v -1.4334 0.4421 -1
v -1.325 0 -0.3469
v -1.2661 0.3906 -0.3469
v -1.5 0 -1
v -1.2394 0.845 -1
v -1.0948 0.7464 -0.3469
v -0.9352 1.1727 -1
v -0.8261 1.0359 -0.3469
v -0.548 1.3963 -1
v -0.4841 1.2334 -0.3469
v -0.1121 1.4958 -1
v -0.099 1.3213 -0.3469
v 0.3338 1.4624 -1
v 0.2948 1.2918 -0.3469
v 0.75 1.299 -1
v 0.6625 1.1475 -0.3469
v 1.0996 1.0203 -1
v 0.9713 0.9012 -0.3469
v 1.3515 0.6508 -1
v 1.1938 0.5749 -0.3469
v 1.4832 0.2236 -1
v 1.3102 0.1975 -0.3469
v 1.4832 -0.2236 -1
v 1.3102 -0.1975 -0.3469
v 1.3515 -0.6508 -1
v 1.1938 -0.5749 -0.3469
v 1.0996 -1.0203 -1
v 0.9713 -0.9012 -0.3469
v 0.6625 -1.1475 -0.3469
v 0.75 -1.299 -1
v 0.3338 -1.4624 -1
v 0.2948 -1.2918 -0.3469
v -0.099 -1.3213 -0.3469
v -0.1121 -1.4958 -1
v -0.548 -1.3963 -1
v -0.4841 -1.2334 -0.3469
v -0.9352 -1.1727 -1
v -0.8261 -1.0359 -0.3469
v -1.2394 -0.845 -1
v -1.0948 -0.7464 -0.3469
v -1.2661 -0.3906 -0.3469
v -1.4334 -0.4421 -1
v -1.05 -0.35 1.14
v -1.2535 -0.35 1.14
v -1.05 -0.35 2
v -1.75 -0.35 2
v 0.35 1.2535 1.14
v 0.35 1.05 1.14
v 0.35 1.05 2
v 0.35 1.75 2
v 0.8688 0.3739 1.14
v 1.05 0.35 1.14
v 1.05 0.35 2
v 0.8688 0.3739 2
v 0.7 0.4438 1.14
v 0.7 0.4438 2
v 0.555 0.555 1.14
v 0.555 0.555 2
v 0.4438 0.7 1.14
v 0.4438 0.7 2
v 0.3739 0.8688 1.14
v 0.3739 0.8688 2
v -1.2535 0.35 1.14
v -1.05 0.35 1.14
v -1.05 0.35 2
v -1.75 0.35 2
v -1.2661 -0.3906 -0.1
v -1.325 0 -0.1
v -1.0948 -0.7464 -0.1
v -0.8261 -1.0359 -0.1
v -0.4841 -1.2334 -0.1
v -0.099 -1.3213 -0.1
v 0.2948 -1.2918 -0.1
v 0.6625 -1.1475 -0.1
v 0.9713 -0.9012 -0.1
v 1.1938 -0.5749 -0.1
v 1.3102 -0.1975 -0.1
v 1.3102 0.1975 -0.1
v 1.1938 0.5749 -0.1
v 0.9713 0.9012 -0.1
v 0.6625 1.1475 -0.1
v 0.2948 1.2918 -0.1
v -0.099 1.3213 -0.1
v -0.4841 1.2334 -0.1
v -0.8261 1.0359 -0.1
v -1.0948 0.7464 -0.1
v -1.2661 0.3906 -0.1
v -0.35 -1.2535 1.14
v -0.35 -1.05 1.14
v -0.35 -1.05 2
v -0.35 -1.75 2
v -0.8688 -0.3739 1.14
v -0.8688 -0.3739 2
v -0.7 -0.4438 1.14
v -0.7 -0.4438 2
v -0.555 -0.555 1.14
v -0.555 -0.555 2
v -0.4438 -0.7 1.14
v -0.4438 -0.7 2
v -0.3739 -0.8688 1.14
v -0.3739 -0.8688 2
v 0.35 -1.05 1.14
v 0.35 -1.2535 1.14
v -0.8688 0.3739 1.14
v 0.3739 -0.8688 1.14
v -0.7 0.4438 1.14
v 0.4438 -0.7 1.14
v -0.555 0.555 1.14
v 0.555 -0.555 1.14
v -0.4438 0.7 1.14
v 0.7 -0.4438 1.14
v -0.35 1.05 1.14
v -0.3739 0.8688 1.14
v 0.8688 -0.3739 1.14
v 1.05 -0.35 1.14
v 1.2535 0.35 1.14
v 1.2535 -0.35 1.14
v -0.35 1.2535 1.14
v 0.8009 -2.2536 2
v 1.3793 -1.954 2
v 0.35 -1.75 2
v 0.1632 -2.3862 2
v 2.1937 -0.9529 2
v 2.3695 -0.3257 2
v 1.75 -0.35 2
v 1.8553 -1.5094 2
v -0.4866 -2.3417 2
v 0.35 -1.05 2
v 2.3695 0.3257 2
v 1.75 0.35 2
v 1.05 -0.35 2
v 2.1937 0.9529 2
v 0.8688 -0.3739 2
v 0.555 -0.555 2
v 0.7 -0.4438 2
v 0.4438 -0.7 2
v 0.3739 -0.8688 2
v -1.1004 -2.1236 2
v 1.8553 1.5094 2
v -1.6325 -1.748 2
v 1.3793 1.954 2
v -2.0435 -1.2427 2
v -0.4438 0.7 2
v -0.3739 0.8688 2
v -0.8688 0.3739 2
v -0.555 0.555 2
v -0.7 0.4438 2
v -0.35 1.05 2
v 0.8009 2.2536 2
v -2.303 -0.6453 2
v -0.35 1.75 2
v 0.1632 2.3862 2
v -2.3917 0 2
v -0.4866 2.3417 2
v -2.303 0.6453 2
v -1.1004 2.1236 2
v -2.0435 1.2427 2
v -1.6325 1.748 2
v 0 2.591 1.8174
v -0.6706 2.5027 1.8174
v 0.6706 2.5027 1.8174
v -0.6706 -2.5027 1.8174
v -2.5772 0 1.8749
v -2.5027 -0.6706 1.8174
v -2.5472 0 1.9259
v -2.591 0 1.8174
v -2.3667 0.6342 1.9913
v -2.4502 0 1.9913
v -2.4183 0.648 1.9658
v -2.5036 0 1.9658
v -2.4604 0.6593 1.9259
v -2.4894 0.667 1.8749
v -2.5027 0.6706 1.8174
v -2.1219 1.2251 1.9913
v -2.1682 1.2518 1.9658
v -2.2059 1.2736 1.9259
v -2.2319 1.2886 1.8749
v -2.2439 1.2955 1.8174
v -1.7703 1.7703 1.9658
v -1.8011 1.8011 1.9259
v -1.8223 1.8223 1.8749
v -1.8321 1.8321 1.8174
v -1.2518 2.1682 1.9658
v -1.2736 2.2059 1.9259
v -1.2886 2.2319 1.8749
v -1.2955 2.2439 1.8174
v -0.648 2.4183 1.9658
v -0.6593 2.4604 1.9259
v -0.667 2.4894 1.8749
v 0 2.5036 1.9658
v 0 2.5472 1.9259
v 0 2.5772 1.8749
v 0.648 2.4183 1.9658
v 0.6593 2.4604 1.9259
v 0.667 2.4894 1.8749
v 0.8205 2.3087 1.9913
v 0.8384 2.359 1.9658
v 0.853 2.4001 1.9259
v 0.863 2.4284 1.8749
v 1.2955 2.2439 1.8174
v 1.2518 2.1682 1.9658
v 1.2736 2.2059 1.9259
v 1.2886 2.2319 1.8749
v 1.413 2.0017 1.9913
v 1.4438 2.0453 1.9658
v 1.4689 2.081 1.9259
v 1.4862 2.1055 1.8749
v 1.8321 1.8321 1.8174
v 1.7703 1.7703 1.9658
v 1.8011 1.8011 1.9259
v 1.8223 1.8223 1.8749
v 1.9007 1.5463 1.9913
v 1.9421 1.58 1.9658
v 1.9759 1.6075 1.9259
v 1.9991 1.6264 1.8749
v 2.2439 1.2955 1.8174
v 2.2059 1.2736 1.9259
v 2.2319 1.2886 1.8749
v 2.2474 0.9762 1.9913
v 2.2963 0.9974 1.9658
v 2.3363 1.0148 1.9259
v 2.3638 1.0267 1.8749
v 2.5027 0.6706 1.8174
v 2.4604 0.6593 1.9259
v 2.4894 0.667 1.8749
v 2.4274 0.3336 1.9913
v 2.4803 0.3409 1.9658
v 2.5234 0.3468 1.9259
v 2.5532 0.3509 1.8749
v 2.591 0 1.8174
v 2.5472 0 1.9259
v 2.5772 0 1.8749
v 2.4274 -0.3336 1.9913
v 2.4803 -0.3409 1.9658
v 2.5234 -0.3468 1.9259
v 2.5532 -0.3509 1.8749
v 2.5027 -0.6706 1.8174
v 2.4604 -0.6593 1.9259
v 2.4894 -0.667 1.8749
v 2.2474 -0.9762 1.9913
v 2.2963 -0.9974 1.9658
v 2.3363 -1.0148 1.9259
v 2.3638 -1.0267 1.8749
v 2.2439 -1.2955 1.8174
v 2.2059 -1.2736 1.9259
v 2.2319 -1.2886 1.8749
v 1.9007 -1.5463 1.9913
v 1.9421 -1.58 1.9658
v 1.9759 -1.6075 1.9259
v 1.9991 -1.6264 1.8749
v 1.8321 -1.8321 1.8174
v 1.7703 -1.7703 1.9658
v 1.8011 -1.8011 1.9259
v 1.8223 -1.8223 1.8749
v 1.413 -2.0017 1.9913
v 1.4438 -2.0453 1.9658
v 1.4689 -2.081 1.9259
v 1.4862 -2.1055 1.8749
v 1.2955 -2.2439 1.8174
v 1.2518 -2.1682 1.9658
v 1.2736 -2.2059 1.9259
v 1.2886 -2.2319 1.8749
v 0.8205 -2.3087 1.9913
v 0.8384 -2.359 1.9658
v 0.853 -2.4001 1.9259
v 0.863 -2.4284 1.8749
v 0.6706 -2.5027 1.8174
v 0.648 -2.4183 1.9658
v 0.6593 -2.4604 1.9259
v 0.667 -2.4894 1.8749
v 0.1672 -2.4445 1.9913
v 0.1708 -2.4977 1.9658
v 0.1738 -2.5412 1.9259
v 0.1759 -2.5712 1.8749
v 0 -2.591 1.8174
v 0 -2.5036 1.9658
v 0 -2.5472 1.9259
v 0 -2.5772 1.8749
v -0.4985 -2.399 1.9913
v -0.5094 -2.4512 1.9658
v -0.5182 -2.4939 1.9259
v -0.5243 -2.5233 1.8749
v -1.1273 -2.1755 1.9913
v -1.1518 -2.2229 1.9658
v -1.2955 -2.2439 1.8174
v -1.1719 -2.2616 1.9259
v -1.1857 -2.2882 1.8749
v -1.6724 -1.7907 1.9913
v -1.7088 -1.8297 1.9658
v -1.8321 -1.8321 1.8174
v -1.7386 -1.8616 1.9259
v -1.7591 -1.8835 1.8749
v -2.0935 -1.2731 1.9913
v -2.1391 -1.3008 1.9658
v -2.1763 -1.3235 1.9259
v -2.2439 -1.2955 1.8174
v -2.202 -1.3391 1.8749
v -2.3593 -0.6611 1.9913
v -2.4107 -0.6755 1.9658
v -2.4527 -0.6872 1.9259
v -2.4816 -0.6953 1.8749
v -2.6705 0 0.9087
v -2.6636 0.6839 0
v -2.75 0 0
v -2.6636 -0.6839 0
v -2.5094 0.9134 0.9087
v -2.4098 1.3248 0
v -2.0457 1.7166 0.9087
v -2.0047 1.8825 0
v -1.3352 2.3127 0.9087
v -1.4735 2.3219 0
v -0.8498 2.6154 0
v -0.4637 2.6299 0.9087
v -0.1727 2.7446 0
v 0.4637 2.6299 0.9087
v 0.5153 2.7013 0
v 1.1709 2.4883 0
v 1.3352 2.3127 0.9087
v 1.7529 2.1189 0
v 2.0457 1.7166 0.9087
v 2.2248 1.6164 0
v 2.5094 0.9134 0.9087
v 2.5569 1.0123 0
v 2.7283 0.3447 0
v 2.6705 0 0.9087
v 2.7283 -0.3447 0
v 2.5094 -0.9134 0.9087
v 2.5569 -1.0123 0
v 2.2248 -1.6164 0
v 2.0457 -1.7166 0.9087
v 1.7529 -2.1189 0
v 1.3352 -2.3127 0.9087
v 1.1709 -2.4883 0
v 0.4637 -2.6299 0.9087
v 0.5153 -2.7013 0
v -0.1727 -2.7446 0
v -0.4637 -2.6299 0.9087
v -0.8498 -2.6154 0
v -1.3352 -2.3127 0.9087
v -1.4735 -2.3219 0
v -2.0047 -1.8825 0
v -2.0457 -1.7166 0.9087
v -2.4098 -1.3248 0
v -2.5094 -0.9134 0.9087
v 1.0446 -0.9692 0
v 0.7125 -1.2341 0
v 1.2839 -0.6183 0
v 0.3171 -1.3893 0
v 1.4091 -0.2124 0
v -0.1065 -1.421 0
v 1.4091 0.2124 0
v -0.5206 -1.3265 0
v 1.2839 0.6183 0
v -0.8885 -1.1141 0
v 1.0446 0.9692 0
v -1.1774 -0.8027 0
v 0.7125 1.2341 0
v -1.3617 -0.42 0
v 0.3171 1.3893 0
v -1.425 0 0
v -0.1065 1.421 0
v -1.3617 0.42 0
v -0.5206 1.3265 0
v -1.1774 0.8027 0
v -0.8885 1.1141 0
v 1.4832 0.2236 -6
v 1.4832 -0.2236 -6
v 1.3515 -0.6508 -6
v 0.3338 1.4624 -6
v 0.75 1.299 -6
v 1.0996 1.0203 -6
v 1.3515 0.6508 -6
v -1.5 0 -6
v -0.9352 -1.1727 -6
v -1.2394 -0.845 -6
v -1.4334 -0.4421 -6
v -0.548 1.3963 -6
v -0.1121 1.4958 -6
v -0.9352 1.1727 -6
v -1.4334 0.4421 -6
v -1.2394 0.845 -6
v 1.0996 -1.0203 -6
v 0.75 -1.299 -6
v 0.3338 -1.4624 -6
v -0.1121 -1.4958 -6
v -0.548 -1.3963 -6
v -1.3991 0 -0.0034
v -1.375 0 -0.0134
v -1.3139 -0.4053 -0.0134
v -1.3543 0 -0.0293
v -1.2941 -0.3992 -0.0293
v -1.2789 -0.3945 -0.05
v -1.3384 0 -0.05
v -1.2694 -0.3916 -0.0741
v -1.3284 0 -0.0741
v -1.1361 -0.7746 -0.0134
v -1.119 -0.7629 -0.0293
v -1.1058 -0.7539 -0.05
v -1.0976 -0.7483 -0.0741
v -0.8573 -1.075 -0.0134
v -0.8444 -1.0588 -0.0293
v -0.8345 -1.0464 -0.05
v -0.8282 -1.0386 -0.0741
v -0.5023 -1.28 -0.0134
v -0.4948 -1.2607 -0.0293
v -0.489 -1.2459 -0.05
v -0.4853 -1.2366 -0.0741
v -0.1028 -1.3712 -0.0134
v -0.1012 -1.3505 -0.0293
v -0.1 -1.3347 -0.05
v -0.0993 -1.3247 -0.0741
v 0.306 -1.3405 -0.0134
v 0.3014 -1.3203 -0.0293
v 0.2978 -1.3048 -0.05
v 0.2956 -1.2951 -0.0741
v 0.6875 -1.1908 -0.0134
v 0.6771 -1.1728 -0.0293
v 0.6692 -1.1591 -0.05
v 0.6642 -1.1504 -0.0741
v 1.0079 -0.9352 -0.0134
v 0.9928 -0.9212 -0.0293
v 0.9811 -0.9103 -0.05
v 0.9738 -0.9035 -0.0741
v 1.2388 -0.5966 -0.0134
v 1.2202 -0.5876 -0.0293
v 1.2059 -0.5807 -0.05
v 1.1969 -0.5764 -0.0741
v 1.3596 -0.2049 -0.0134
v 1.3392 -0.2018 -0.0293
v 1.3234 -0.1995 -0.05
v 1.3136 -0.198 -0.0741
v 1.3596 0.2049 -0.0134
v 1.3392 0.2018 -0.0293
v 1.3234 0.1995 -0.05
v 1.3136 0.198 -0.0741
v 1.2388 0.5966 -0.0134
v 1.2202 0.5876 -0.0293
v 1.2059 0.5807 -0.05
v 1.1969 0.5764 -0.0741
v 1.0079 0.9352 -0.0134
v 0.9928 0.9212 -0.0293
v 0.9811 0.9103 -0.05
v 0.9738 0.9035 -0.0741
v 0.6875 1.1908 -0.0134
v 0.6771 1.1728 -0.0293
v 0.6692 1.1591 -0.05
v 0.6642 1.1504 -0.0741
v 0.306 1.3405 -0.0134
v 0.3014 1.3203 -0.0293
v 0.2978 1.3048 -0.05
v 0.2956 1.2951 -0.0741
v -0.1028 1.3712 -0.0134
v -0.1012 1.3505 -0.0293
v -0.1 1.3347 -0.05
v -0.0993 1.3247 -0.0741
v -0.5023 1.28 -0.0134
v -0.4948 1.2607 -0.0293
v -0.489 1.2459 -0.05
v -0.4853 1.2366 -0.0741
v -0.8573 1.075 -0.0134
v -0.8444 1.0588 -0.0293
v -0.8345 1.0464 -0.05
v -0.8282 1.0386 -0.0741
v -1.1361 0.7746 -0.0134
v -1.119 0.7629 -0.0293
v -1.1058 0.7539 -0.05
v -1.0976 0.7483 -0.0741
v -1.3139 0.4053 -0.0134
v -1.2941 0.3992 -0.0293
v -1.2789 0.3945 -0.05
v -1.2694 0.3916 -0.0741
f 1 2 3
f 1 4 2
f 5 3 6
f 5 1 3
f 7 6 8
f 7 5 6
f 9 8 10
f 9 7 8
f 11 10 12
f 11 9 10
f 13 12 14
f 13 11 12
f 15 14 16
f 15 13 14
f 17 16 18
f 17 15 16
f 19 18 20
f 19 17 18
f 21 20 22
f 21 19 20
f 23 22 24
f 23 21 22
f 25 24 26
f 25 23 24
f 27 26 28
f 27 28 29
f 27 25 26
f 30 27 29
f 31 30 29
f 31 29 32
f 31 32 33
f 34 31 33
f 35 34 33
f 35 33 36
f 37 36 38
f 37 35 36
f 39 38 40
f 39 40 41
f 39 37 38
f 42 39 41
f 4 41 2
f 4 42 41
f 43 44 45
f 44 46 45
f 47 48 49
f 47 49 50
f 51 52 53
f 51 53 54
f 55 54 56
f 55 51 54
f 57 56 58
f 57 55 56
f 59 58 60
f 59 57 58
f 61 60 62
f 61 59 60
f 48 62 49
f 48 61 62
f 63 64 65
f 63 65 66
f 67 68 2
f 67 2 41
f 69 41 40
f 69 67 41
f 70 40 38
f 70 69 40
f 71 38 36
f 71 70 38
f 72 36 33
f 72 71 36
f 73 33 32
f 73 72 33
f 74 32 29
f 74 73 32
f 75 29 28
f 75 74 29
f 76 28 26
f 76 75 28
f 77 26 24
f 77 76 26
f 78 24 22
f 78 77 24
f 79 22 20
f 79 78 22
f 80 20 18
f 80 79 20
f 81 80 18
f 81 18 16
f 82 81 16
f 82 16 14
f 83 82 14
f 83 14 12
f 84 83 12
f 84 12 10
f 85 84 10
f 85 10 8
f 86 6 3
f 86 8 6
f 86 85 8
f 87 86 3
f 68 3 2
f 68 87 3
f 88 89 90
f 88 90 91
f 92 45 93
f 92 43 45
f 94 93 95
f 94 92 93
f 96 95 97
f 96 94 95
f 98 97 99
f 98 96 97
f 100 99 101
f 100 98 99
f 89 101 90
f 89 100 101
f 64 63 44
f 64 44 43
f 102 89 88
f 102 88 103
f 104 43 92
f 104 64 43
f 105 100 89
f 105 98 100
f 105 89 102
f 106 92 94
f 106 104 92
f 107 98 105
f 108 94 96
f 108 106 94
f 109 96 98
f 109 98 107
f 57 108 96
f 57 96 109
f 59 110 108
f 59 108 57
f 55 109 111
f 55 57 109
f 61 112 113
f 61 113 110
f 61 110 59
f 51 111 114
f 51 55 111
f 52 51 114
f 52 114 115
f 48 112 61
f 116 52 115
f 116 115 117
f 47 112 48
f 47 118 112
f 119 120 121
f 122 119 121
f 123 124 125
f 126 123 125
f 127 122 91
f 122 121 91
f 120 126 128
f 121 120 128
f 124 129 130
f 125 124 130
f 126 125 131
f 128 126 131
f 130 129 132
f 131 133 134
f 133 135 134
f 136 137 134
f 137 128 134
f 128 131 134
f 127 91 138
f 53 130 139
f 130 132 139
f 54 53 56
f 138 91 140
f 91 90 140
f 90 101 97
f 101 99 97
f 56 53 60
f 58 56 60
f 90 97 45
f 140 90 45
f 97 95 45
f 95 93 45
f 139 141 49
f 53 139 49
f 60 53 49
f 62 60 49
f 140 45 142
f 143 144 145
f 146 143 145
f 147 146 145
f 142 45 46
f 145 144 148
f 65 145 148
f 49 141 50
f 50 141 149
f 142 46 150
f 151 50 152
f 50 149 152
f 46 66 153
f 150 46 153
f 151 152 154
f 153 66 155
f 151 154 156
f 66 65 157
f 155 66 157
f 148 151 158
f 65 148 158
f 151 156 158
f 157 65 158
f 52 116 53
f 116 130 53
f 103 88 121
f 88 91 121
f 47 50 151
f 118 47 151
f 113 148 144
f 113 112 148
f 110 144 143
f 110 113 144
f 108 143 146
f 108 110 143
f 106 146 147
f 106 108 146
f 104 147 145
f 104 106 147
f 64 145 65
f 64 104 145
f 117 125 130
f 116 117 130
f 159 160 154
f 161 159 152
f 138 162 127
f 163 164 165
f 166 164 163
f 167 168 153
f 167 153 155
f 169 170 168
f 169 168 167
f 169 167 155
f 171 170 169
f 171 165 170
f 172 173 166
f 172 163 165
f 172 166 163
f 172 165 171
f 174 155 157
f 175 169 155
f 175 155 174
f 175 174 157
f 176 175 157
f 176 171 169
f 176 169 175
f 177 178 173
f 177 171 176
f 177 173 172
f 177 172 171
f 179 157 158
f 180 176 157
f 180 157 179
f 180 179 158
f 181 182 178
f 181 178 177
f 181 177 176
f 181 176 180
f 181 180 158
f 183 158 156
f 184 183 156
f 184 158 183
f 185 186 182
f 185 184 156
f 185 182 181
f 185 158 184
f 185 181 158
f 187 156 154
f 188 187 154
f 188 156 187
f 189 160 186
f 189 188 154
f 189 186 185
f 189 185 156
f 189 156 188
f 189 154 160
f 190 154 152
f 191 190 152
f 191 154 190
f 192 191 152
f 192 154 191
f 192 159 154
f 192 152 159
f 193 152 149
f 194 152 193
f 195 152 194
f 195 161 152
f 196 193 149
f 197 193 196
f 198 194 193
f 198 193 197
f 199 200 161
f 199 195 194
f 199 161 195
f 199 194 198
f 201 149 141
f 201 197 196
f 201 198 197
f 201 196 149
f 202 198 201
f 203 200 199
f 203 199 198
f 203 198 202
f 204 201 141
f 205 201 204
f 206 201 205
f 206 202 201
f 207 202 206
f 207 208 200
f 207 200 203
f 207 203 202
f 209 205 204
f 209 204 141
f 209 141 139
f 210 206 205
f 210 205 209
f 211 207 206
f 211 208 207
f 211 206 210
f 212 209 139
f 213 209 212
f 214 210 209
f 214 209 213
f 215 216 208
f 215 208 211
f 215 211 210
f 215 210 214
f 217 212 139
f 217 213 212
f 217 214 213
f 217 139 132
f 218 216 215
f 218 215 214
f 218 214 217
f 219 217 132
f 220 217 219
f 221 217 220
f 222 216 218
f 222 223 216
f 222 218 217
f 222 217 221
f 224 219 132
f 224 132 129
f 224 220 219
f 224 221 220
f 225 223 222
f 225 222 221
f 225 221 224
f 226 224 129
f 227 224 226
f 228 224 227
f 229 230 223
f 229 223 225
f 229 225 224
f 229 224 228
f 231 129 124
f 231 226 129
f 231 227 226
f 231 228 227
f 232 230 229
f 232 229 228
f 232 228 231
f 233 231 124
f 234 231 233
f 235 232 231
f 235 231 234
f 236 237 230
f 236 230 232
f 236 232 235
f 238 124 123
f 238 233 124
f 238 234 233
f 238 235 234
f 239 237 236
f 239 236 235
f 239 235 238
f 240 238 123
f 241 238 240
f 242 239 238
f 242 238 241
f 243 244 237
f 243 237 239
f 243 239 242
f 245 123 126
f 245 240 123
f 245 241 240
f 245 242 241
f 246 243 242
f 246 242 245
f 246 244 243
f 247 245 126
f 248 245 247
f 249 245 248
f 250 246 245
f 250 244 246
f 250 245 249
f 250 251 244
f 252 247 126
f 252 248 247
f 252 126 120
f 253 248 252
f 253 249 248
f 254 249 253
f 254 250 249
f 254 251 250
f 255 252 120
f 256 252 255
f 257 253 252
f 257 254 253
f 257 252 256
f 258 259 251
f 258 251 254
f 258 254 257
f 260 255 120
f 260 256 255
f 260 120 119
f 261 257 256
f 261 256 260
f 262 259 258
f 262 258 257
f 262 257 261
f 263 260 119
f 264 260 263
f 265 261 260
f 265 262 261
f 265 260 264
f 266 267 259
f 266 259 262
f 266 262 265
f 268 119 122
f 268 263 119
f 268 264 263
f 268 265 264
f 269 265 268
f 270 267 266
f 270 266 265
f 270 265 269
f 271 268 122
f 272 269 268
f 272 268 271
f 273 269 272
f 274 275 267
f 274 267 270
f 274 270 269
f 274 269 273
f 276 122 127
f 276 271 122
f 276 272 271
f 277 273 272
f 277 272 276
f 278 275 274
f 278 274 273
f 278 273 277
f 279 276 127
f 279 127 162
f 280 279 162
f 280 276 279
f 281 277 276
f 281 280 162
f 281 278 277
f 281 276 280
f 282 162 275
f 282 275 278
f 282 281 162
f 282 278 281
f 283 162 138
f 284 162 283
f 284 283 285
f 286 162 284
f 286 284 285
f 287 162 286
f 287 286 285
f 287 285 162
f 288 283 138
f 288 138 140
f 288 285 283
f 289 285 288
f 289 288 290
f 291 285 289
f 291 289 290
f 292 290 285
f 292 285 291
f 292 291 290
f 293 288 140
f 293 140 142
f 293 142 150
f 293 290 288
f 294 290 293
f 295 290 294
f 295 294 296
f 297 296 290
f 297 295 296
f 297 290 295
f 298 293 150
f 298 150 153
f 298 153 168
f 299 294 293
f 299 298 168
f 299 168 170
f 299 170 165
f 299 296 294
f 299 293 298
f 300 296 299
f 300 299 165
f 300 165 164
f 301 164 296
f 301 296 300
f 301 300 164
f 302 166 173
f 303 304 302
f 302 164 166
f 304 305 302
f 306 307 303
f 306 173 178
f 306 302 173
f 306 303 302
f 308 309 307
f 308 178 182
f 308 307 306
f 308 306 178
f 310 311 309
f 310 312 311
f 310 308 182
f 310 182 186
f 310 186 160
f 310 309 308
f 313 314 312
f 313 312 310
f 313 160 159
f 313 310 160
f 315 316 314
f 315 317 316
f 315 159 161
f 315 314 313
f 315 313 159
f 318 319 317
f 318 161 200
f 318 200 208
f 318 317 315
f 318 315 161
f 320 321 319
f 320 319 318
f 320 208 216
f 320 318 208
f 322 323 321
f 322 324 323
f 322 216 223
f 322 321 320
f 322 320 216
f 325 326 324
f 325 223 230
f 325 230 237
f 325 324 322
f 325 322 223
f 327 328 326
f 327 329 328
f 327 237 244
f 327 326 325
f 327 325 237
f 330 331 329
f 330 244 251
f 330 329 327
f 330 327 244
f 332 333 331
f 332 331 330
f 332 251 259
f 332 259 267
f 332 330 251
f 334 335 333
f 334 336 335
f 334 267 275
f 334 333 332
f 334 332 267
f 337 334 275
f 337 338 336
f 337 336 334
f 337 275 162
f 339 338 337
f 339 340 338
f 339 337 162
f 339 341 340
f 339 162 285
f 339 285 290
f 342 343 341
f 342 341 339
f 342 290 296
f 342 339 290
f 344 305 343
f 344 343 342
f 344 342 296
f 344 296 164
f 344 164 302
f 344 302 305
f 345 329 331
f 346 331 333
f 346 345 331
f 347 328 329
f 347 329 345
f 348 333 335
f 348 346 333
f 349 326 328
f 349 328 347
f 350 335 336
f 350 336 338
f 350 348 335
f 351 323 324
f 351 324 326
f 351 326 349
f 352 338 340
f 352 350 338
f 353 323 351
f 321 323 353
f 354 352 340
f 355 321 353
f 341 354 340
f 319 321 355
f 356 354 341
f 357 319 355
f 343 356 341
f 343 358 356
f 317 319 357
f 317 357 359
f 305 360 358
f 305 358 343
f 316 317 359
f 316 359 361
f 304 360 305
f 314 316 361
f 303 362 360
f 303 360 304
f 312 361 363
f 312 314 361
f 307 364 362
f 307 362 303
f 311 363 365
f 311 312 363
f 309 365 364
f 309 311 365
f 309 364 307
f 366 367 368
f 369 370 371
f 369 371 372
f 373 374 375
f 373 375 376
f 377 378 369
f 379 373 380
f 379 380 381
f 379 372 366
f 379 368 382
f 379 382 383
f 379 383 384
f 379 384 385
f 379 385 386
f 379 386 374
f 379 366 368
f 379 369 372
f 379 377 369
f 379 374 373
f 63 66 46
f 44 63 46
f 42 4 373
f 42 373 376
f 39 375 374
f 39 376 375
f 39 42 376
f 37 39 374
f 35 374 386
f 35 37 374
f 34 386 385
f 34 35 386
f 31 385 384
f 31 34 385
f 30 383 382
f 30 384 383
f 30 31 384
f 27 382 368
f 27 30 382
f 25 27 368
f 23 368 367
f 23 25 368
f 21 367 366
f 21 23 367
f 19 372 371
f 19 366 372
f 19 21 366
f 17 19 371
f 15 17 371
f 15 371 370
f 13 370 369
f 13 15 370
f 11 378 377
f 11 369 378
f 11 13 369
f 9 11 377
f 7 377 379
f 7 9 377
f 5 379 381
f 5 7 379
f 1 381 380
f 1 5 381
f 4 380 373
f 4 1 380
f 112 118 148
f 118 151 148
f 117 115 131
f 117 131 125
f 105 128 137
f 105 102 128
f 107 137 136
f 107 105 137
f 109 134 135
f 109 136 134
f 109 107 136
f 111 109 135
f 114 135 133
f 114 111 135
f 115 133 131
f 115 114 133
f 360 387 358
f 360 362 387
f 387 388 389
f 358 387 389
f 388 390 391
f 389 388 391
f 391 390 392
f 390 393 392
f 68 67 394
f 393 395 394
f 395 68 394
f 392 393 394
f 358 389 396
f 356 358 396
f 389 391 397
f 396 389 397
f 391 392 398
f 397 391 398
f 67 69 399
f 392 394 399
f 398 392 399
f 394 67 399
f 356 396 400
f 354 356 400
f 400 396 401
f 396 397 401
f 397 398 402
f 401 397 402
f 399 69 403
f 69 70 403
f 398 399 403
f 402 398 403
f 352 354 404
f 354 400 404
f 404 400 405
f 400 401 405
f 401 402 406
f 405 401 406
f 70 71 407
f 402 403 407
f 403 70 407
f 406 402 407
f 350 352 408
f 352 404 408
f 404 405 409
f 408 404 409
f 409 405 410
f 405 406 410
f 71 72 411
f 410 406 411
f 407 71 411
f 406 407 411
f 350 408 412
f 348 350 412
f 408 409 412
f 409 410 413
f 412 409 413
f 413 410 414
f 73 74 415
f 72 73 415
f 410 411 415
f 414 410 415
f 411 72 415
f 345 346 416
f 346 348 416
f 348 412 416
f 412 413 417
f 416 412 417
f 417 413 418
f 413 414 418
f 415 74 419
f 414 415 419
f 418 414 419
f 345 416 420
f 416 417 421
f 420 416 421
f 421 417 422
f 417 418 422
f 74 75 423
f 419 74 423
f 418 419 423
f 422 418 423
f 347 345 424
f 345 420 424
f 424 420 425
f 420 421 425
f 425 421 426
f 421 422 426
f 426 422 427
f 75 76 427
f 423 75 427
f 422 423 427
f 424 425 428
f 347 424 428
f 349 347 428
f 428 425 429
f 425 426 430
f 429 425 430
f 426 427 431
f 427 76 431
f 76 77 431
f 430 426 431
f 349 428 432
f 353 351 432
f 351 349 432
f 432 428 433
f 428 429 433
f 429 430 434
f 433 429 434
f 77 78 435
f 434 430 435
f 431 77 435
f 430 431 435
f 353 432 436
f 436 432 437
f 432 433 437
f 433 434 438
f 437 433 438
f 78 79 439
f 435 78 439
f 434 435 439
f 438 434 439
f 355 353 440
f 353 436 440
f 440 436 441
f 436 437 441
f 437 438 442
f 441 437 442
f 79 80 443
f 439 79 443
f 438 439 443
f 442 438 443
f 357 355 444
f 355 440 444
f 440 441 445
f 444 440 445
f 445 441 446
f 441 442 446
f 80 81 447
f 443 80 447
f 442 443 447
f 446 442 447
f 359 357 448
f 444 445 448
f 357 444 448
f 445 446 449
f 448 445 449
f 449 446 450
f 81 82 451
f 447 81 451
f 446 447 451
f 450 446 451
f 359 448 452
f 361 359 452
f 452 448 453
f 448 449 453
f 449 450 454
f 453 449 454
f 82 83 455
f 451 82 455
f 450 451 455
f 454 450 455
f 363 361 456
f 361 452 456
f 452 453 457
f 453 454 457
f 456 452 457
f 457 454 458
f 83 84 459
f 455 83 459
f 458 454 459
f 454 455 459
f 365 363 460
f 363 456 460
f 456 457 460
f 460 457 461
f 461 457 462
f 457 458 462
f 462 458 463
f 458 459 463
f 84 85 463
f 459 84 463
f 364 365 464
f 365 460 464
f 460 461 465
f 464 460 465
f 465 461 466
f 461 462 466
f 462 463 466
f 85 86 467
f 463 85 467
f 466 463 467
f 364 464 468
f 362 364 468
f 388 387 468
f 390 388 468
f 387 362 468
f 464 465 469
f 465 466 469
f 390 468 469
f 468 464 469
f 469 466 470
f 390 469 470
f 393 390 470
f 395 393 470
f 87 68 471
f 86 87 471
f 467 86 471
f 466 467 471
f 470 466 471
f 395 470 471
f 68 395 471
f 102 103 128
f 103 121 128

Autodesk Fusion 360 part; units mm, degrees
sketch "Sketch1" plane through (0, 0, 0) normal (0, 1, 0) x (1, 0, 0)
  line L0 (0, -2) -> (0, 6)
  line L1 (-2.75, 0) -> (-2.575, -2)
  line L2 (-2.75, 0) -> (-1.325, 0)
  line L3 (0, 6) -> (-1.5, 6)
  line L4 (-1.5, 6) -> (-1.5, 1)
  line L5 (-1.5, 1) -> (-1.325, 0.3469)
  line L6 (-1.325, 0.3469) -> (-1.325, 0)
  line L7 (0, -2) -> (-2.575, -2)
  dimension "d13" = 5
  dimension "d14" = 5.5
  dimension "d18" = 3
  dimension "d56" = 6
  dimension "d65" = 15
  dimension "d67" = 2
  dimension "d71" = 2.65
  dimension "d77" = 1
revolve "Revolve1" add sketch "Sketch1" angle 360 about axis through (0, 0, 2) along (0, 0, -1) makes body 1
fillet "Fillet3" radius 0.2 1 edges at (-2.4008, 0.9312, 2) on bodies 1
fillet "Fillet2" radius 0.1 1 edges at (-1.2353, 0.4791, 0) on bodies 1
sketch "Sketch2" plane through (0, 0, 2) normal (0, 0, 1) x (1, 0, 0)
  line L0 (-0.35, 0.35) -> (-1.75, 0.35)
  line L1 (-1.75, 0.35) -> (-1.75, -0.35)
  line L2 (-1.75, -0.35) -> (-0.35, -0.35)
  line L3 (-0.35, -0.35) -> (-0.35, -1.75)
  line L4 (-0.35, -1.75) -> (0.35, -1.75)
  line L5 (0.35, -1.75) -> (0.35, -0.35)
  line L6 (0.35, -0.35) -> (1.75, -0.35)
  line L7 (1.75, -0.35) -> (1.75, 0.35)
  line L8 (1.75, 0.35) -> (0.35, 0.35)
  line L9 (0.35, 0.35) -> (0.35, 1.75)
  line L10 (0.35, 1.75) -> (-0.35, 1.75)
  line L11 (-0.35, 1.75) -> (-0.35, 0.35)
  dimension "d81" = 360
  dimension "d83" = 0.7
  dimension "d84" = 3.5
extrude "Extrude1" add sketch "Sketch2" against normal blind 0.86 separate body makes body 2
draft "Draft1" angle -30 neutral plane through (0, 0, 2) pull (0, 0, 1) 4 faces at (1.75, -0.1167, 1.7133) (0.1167, 1.75, 1.7133) (-1.75, 0.1167, 1.7133) (-0.1167, -1.75, 1.7133) on bodies 2
fillet "Fillet1" radius 0.7 4 edges at (-0.35, 0.35, 1.57) (-0.35, -0.35, 1.57) (0.35, -0.35, 1.57) (0.35, 0.35, 1.57) on bodies 2
combine "Combine1" operation cut target body 1 tool bodies 2
thread "Thread3" thread offset 0 thread length 10
equation "adsk_nomdia = 3.00 mm"
equation "adsk_nomlen = 6.00 mm"
equation "adsk_headdia = 5.50 mm"
equation "adsk_phildia = 3.50 mm"
equation "adsk_midfillet = 0.10 mm"
equation "adsk_phildepth = 0.86 mm"
equation "adsk_shnklen = 1.00 mm"
equation "adsk_thrang = 15 deg"
equation "adsk_headang = 5 deg"
equation "d13 = adsk_headang"
equation "d14 = adsk_headdia"
equation "d18 = adsk_nomdia"
equation "adsk_philwidth = 0.70 mm"
equation "d52 = adsk_midfillet"
equation "d56 = adsk_nomlen"
equation "d65 = adsk_thrang"
equation "d67 = adsk_headh"
equation "adsk_headh = 2.00 mm"
equation "adsk_pitch1 = 0.50 mm"
equation "adsk_shnkdia = adsk_nomdia - 0.7 * adsk_pitch1"
equation "d71 = adsk_shnkdia"
equation "adsk_headtoprad = adsk_headh * 0.1"
equation "d76 = adsk_headtoprad"
equation "d77 = adsk_shnklen"
equation "d83 = adsk_philwidth"
equation "d84 = adsk_phildia"
equation "d86 = adsk_philwidth"
properties part number "ISO 7048 - H - M3 x 6 Steel 4.6 Plain"
